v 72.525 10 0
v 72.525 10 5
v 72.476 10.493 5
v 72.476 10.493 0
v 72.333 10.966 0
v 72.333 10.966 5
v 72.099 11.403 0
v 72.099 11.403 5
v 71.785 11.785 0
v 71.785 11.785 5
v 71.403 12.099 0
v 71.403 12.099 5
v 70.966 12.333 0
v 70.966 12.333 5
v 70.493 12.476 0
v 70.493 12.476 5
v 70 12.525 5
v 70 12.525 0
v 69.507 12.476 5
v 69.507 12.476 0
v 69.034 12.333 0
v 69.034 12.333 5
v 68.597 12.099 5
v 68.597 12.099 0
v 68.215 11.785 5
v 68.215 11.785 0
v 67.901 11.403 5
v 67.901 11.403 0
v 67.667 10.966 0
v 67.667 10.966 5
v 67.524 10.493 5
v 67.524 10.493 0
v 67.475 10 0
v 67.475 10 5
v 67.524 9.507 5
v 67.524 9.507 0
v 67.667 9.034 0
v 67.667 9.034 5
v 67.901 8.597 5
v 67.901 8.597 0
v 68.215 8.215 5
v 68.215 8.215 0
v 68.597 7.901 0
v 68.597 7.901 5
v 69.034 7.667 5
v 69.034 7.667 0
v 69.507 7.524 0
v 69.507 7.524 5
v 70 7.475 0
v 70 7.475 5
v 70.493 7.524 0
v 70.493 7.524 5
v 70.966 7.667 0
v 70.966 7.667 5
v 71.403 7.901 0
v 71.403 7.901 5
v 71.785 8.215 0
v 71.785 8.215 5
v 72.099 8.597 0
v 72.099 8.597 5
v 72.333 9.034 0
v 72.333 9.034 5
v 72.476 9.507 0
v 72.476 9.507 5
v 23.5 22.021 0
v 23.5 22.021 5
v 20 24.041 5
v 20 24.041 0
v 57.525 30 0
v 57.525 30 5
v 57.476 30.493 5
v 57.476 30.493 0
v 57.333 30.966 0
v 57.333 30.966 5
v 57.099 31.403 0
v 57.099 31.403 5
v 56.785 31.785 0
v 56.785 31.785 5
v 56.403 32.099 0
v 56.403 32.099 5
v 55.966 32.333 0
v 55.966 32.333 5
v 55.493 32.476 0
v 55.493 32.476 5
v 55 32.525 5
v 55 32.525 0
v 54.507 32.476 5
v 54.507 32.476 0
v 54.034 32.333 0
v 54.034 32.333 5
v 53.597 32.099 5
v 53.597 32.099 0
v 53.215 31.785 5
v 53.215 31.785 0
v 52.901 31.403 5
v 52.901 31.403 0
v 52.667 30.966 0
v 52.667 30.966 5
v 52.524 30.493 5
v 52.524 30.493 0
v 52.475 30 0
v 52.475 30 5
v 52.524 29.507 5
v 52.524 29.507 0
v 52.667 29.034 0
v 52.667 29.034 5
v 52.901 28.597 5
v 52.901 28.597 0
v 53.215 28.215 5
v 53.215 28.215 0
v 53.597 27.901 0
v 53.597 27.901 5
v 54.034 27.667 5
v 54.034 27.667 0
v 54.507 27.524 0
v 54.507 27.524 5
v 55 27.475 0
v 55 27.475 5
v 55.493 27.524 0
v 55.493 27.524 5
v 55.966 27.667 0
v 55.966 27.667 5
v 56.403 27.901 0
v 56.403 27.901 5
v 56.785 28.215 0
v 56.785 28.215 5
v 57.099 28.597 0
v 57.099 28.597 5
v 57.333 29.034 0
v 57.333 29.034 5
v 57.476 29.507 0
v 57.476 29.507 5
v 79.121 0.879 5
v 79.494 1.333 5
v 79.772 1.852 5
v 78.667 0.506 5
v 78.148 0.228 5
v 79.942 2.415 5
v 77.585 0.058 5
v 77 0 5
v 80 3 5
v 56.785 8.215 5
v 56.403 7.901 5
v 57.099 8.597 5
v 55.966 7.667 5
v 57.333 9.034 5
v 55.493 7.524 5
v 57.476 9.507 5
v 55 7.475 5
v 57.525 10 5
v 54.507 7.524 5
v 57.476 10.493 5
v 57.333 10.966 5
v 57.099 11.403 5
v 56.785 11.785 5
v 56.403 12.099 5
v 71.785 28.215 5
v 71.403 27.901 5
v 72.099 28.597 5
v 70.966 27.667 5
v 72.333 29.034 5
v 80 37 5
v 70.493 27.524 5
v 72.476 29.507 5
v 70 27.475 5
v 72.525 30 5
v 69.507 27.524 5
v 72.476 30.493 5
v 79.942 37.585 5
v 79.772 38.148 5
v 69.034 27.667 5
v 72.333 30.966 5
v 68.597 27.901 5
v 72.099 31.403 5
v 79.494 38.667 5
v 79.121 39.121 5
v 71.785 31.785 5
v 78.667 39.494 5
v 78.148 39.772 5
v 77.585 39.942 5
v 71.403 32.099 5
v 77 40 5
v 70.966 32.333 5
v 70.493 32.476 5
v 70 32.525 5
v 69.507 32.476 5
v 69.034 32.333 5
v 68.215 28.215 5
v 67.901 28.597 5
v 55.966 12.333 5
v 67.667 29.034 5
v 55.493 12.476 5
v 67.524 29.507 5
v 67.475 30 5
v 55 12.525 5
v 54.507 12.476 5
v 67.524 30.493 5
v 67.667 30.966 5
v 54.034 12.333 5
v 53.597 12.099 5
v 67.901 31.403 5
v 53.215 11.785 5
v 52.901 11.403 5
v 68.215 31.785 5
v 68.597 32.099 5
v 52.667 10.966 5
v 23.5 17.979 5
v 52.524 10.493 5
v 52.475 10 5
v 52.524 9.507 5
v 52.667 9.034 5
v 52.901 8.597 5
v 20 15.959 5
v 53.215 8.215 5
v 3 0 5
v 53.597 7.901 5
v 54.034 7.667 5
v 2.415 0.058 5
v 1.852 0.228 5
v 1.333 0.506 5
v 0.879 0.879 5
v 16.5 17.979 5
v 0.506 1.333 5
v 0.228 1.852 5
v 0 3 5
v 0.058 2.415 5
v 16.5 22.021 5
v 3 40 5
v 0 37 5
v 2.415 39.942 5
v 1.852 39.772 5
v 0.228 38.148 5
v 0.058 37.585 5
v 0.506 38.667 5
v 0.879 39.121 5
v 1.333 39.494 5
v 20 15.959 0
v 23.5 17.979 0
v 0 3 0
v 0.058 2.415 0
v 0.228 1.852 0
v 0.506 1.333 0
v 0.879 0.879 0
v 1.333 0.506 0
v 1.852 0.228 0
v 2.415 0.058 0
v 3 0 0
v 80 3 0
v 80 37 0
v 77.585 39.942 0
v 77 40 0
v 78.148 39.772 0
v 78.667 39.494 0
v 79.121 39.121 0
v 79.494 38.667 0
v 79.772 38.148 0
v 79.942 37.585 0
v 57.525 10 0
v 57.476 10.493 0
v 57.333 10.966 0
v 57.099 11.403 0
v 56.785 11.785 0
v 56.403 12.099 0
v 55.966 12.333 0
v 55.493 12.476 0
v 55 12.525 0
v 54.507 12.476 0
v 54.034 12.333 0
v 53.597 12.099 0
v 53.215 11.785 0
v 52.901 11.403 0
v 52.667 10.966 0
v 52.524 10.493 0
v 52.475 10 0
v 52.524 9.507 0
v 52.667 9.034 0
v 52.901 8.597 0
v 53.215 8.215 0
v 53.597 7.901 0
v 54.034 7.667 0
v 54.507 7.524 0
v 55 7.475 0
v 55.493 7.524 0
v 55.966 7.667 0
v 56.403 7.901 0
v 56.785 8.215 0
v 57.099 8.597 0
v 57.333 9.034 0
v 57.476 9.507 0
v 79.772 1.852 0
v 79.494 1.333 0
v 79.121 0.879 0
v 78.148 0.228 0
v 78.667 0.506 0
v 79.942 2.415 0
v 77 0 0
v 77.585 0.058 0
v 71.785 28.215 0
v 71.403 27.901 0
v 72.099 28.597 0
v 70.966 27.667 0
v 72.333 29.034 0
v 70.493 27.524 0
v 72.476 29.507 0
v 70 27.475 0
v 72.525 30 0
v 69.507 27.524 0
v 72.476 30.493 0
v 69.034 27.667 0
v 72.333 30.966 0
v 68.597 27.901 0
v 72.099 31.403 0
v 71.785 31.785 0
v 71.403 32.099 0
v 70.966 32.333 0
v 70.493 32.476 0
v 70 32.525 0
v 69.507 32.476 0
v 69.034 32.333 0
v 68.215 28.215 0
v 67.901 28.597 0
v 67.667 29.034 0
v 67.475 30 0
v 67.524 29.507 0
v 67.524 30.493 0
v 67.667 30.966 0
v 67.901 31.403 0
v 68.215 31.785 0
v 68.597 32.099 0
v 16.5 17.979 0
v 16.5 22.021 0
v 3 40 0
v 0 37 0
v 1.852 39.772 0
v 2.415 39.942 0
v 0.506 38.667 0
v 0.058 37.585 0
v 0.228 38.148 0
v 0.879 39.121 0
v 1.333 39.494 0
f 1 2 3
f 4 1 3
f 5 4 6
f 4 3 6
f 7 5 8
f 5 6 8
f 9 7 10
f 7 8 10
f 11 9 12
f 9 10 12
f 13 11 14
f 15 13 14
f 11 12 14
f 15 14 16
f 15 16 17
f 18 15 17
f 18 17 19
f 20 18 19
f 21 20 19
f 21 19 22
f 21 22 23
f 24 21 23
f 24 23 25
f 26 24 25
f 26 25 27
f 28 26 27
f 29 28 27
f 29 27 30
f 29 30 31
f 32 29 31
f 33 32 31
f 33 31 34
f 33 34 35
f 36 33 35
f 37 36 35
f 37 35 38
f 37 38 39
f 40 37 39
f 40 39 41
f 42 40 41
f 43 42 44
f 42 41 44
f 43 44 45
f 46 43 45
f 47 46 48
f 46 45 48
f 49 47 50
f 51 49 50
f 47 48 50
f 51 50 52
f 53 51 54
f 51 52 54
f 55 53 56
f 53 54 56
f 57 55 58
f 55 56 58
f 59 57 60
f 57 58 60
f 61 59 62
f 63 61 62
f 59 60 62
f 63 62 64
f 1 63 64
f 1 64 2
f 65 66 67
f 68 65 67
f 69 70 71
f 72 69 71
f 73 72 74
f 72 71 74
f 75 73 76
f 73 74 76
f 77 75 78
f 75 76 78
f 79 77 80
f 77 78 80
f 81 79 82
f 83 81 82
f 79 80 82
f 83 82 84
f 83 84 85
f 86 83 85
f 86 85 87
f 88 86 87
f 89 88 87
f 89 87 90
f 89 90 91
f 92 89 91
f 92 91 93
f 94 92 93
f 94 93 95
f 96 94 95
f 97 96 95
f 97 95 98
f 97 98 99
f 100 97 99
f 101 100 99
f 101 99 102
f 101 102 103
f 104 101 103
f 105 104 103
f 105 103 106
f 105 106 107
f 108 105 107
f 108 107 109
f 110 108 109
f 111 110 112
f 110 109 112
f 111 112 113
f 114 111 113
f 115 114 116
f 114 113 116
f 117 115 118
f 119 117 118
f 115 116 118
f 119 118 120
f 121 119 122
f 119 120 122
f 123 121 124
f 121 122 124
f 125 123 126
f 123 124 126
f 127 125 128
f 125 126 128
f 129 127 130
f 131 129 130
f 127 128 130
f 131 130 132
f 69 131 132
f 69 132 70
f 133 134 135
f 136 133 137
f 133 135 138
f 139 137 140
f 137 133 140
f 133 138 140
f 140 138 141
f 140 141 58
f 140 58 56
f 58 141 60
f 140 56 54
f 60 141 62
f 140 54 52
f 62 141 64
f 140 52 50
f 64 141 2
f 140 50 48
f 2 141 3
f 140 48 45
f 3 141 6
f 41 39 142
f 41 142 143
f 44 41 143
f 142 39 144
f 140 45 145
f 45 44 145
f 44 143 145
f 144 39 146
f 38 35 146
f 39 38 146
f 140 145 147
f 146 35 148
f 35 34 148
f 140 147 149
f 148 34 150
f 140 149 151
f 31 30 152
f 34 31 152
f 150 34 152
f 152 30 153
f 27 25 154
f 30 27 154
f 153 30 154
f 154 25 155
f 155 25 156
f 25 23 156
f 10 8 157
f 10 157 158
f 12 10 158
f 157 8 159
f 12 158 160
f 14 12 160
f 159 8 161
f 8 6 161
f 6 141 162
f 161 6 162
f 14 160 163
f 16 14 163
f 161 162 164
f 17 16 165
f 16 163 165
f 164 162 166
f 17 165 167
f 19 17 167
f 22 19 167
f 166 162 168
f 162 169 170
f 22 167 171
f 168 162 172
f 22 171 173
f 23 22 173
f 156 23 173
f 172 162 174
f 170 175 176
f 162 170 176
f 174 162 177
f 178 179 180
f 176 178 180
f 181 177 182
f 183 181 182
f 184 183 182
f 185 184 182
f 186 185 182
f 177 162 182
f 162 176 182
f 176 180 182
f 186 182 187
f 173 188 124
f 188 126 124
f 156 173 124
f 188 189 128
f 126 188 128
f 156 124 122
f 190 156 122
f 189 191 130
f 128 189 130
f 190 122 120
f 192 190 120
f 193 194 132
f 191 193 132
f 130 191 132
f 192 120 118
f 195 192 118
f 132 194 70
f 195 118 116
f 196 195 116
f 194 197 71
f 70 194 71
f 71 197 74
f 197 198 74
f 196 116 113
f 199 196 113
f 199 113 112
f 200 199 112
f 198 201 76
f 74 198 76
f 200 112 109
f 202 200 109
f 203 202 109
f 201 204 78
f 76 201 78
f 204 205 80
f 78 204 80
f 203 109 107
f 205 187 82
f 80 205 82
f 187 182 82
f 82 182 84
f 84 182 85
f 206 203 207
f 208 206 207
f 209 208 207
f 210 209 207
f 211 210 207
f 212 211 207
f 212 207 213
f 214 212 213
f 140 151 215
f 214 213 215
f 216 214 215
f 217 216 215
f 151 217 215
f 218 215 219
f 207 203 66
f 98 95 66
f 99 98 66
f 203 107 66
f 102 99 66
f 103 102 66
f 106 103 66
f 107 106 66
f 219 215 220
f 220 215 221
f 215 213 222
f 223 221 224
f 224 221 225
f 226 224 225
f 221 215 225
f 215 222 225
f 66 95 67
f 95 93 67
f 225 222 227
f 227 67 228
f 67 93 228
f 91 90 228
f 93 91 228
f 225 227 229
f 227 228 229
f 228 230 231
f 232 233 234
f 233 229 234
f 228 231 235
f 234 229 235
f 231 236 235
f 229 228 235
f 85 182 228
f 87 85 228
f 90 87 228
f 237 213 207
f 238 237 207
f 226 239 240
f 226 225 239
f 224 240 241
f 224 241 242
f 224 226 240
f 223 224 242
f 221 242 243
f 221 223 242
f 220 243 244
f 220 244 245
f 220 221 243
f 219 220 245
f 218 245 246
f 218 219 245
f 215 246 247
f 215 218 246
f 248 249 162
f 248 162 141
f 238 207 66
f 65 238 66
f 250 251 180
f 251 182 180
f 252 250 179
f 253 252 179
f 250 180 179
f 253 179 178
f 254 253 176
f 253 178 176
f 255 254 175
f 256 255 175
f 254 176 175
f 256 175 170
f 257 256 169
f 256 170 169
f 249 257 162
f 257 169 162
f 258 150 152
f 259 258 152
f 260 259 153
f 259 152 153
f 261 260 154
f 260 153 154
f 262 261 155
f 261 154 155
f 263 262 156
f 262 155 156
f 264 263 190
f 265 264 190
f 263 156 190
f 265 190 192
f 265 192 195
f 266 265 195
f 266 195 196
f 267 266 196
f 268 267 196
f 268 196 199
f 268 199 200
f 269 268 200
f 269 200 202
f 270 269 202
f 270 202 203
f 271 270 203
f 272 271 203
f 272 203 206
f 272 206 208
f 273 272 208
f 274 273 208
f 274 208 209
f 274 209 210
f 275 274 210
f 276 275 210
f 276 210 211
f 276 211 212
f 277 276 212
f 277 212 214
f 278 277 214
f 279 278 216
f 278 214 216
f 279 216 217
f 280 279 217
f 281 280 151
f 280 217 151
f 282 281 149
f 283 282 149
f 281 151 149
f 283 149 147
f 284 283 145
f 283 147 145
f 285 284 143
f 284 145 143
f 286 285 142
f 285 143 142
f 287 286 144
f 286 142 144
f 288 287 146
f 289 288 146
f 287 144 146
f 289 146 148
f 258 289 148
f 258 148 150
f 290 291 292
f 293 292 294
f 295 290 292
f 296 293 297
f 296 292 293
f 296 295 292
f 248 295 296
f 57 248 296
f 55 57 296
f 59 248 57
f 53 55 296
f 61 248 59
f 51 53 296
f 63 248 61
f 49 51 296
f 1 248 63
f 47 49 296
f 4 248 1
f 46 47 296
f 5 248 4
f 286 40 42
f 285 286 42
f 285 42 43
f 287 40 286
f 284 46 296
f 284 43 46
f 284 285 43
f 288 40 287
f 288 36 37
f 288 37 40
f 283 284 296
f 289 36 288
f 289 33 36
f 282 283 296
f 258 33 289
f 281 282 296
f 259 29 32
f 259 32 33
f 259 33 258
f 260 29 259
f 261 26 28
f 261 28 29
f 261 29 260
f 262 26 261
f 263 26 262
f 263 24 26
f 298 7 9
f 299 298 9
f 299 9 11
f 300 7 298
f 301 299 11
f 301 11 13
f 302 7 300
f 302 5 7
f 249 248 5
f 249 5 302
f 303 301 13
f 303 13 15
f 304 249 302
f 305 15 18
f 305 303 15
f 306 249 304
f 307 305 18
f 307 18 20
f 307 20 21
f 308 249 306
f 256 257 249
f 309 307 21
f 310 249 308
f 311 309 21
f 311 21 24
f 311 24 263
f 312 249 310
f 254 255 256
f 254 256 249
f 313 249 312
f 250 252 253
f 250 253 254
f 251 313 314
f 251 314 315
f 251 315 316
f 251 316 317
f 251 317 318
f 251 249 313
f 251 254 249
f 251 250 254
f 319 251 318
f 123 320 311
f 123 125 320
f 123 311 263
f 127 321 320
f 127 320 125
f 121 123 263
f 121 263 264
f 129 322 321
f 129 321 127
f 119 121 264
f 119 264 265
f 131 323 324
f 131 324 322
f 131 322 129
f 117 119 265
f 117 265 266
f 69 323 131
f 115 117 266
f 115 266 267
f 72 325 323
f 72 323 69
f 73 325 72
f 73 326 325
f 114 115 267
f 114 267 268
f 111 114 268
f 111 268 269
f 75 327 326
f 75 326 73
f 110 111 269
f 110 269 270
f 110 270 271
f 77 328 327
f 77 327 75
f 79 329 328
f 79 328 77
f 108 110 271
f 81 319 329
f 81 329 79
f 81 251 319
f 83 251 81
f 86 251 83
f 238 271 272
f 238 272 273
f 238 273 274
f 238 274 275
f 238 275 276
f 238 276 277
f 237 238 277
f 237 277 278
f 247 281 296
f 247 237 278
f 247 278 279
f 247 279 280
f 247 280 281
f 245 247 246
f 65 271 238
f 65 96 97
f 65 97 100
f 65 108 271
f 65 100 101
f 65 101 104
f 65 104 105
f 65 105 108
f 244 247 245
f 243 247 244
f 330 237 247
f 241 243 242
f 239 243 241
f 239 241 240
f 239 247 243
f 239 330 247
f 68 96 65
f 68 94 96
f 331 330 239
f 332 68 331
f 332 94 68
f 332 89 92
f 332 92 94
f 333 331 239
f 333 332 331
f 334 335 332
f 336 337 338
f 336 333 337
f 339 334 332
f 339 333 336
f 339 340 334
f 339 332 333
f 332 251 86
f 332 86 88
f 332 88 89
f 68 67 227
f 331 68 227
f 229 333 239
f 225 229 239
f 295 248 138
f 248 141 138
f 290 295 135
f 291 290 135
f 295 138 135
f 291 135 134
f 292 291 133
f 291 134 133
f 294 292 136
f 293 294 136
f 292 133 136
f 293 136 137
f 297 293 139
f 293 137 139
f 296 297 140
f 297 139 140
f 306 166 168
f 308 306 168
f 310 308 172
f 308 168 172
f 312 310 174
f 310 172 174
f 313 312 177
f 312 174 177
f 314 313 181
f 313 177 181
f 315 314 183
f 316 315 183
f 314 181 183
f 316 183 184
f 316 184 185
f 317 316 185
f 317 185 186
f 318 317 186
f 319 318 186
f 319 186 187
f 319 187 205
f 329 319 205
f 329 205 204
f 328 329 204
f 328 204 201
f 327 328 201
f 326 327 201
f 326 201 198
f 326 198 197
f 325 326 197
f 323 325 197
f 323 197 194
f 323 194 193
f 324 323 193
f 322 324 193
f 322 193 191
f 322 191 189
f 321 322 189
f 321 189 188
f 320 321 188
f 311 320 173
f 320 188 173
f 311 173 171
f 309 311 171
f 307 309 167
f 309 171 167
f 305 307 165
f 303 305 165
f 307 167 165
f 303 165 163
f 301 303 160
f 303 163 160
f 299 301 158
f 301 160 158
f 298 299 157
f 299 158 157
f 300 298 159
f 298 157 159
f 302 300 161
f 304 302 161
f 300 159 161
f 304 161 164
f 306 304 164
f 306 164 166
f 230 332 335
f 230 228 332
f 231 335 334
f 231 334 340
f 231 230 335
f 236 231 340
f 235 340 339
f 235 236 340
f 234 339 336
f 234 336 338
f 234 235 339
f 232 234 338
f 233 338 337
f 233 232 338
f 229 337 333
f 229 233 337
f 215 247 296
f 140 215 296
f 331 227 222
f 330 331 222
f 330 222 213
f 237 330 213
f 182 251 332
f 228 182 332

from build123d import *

# Parameters (mm, degrees)
BOSS_EXTRUDE1_DEPTH = 5
CUT_EXTRUDE1_REACH  = 91.582
CUT_EXTRUDE2_REACH  = 91.582
SKETCH3_R           = 2.525
FILLET1_R           = 3
FILLET2_R           = 3


with BuildPart() as part:
    # Sketch1 → Boss-Extrude1 (new body)
    with BuildSketch(Plane.XY):
        Polygon((20, 40), (80, 40), (80, 0), (20, 0), (0, 0), (0, 20), (0, 40), align=None)
    extrude(amount=BOSS_EXTRUDE1_DEPTH)

    # Sketch2 → Cut-Extrude1 (cut, up to next)
    with BuildSketch(Plane.XY.offset(5), mode=Mode.PRIVATE) as cut_extrude1_sk1:
        Polygon((20, 15.958548116), (23.5, 17.979274058), (23.5, 22.020725942), (20, 24.041451884), (16.5, 22.020725942), (16.5, 17.979274058), align=None)
    cut_extrude1_tool1 = extrude(cut_extrude1_sk1.sketch, amount=-CUT_EXTRUDE1_REACH, mode=Mode.PRIVATE) & part.part
    add(cut_extrude1_tool1.solids().sort_by_distance((20, 20, 5))[0], mode=Mode.SUBTRACT)

    # Sketch3 → Cut-Extrude2 (cut, up to next)
    with BuildSketch(Plane.XY.offset(5), mode=Mode.PRIVATE) as cut_extrude2_sk1:
        with Locations((55, 30)):
            Circle(SKETCH3_R)
    cut_extrude2_tool1 = extrude(cut_extrude2_sk1.sketch, amount=-CUT_EXTRUDE2_REACH, mode=Mode.PRIVATE) & part.part
    # Sketch3 → Cut-Extrude2 (cut, up to next)
    with BuildSketch(Plane.XY.offset(5), mode=Mode.PRIVATE) as cut_extrude2_sk2:
        with Locations((55, 10)):
            Circle(SKETCH3_R)
    cut_extrude2_tool2 = extrude(cut_extrude2_sk2.sketch, amount=-CUT_EXTRUDE2_REACH, mode=Mode.PRIVATE) & part.part
    # Sketch3 → Cut-Extrude2 (cut, up to next)
    with BuildSketch(Plane.XY.offset(5), mode=Mode.PRIVATE) as cut_extrude2_sk3:
        with Locations((70, 30)):
            Circle(SKETCH3_R)
    cut_extrude2_tool3 = extrude(cut_extrude2_sk3.sketch, amount=-CUT_EXTRUDE2_REACH, mode=Mode.PRIVATE) & part.part
    # Sketch3 → Cut-Extrude2 (cut, up to next)
    with BuildSketch(Plane.XY.offset(5), mode=Mode.PRIVATE) as cut_extrude2_sk4:
        with Locations((70, 10)):
            Circle(SKETCH3_R)
    cut_extrude2_tool4 = extrude(cut_extrude2_sk4.sketch, amount=-CUT_EXTRUDE2_REACH, mode=Mode.PRIVATE) & part.part
    add(cut_extrude2_tool1.solids().sort_by_distance((55, 30, 5))[0], mode=Mode.SUBTRACT)
    add(cut_extrude2_tool2.solids().sort_by_distance((55, 10, 5))[0], mode=Mode.SUBTRACT)
    add(cut_extrude2_tool3.solids().sort_by_distance((70, 30, 5))[0], mode=Mode.SUBTRACT)
    add(cut_extrude2_tool4.solids().sort_by_distance((70, 10, 5))[0], mode=Mode.SUBTRACT)

    # Fillet1
    fillet1_edges = [part.edges().sort_by_distance(p)[0] for p in [
        (80, 40, 2.5),
        (80, 0, 2.5),
    ]]
    fillet(fillet1_edges, radius=FILLET1_R)

    # Fillet2
    fillet2_edges = [part.edges().sort_by_distance(p)[0] for p in [
        (0, 0, 2.5),
        (0, 40, 2.5),
    ]]
    fillet(fillet2_edges, radius=FILLET2_R)


solid = part.part
